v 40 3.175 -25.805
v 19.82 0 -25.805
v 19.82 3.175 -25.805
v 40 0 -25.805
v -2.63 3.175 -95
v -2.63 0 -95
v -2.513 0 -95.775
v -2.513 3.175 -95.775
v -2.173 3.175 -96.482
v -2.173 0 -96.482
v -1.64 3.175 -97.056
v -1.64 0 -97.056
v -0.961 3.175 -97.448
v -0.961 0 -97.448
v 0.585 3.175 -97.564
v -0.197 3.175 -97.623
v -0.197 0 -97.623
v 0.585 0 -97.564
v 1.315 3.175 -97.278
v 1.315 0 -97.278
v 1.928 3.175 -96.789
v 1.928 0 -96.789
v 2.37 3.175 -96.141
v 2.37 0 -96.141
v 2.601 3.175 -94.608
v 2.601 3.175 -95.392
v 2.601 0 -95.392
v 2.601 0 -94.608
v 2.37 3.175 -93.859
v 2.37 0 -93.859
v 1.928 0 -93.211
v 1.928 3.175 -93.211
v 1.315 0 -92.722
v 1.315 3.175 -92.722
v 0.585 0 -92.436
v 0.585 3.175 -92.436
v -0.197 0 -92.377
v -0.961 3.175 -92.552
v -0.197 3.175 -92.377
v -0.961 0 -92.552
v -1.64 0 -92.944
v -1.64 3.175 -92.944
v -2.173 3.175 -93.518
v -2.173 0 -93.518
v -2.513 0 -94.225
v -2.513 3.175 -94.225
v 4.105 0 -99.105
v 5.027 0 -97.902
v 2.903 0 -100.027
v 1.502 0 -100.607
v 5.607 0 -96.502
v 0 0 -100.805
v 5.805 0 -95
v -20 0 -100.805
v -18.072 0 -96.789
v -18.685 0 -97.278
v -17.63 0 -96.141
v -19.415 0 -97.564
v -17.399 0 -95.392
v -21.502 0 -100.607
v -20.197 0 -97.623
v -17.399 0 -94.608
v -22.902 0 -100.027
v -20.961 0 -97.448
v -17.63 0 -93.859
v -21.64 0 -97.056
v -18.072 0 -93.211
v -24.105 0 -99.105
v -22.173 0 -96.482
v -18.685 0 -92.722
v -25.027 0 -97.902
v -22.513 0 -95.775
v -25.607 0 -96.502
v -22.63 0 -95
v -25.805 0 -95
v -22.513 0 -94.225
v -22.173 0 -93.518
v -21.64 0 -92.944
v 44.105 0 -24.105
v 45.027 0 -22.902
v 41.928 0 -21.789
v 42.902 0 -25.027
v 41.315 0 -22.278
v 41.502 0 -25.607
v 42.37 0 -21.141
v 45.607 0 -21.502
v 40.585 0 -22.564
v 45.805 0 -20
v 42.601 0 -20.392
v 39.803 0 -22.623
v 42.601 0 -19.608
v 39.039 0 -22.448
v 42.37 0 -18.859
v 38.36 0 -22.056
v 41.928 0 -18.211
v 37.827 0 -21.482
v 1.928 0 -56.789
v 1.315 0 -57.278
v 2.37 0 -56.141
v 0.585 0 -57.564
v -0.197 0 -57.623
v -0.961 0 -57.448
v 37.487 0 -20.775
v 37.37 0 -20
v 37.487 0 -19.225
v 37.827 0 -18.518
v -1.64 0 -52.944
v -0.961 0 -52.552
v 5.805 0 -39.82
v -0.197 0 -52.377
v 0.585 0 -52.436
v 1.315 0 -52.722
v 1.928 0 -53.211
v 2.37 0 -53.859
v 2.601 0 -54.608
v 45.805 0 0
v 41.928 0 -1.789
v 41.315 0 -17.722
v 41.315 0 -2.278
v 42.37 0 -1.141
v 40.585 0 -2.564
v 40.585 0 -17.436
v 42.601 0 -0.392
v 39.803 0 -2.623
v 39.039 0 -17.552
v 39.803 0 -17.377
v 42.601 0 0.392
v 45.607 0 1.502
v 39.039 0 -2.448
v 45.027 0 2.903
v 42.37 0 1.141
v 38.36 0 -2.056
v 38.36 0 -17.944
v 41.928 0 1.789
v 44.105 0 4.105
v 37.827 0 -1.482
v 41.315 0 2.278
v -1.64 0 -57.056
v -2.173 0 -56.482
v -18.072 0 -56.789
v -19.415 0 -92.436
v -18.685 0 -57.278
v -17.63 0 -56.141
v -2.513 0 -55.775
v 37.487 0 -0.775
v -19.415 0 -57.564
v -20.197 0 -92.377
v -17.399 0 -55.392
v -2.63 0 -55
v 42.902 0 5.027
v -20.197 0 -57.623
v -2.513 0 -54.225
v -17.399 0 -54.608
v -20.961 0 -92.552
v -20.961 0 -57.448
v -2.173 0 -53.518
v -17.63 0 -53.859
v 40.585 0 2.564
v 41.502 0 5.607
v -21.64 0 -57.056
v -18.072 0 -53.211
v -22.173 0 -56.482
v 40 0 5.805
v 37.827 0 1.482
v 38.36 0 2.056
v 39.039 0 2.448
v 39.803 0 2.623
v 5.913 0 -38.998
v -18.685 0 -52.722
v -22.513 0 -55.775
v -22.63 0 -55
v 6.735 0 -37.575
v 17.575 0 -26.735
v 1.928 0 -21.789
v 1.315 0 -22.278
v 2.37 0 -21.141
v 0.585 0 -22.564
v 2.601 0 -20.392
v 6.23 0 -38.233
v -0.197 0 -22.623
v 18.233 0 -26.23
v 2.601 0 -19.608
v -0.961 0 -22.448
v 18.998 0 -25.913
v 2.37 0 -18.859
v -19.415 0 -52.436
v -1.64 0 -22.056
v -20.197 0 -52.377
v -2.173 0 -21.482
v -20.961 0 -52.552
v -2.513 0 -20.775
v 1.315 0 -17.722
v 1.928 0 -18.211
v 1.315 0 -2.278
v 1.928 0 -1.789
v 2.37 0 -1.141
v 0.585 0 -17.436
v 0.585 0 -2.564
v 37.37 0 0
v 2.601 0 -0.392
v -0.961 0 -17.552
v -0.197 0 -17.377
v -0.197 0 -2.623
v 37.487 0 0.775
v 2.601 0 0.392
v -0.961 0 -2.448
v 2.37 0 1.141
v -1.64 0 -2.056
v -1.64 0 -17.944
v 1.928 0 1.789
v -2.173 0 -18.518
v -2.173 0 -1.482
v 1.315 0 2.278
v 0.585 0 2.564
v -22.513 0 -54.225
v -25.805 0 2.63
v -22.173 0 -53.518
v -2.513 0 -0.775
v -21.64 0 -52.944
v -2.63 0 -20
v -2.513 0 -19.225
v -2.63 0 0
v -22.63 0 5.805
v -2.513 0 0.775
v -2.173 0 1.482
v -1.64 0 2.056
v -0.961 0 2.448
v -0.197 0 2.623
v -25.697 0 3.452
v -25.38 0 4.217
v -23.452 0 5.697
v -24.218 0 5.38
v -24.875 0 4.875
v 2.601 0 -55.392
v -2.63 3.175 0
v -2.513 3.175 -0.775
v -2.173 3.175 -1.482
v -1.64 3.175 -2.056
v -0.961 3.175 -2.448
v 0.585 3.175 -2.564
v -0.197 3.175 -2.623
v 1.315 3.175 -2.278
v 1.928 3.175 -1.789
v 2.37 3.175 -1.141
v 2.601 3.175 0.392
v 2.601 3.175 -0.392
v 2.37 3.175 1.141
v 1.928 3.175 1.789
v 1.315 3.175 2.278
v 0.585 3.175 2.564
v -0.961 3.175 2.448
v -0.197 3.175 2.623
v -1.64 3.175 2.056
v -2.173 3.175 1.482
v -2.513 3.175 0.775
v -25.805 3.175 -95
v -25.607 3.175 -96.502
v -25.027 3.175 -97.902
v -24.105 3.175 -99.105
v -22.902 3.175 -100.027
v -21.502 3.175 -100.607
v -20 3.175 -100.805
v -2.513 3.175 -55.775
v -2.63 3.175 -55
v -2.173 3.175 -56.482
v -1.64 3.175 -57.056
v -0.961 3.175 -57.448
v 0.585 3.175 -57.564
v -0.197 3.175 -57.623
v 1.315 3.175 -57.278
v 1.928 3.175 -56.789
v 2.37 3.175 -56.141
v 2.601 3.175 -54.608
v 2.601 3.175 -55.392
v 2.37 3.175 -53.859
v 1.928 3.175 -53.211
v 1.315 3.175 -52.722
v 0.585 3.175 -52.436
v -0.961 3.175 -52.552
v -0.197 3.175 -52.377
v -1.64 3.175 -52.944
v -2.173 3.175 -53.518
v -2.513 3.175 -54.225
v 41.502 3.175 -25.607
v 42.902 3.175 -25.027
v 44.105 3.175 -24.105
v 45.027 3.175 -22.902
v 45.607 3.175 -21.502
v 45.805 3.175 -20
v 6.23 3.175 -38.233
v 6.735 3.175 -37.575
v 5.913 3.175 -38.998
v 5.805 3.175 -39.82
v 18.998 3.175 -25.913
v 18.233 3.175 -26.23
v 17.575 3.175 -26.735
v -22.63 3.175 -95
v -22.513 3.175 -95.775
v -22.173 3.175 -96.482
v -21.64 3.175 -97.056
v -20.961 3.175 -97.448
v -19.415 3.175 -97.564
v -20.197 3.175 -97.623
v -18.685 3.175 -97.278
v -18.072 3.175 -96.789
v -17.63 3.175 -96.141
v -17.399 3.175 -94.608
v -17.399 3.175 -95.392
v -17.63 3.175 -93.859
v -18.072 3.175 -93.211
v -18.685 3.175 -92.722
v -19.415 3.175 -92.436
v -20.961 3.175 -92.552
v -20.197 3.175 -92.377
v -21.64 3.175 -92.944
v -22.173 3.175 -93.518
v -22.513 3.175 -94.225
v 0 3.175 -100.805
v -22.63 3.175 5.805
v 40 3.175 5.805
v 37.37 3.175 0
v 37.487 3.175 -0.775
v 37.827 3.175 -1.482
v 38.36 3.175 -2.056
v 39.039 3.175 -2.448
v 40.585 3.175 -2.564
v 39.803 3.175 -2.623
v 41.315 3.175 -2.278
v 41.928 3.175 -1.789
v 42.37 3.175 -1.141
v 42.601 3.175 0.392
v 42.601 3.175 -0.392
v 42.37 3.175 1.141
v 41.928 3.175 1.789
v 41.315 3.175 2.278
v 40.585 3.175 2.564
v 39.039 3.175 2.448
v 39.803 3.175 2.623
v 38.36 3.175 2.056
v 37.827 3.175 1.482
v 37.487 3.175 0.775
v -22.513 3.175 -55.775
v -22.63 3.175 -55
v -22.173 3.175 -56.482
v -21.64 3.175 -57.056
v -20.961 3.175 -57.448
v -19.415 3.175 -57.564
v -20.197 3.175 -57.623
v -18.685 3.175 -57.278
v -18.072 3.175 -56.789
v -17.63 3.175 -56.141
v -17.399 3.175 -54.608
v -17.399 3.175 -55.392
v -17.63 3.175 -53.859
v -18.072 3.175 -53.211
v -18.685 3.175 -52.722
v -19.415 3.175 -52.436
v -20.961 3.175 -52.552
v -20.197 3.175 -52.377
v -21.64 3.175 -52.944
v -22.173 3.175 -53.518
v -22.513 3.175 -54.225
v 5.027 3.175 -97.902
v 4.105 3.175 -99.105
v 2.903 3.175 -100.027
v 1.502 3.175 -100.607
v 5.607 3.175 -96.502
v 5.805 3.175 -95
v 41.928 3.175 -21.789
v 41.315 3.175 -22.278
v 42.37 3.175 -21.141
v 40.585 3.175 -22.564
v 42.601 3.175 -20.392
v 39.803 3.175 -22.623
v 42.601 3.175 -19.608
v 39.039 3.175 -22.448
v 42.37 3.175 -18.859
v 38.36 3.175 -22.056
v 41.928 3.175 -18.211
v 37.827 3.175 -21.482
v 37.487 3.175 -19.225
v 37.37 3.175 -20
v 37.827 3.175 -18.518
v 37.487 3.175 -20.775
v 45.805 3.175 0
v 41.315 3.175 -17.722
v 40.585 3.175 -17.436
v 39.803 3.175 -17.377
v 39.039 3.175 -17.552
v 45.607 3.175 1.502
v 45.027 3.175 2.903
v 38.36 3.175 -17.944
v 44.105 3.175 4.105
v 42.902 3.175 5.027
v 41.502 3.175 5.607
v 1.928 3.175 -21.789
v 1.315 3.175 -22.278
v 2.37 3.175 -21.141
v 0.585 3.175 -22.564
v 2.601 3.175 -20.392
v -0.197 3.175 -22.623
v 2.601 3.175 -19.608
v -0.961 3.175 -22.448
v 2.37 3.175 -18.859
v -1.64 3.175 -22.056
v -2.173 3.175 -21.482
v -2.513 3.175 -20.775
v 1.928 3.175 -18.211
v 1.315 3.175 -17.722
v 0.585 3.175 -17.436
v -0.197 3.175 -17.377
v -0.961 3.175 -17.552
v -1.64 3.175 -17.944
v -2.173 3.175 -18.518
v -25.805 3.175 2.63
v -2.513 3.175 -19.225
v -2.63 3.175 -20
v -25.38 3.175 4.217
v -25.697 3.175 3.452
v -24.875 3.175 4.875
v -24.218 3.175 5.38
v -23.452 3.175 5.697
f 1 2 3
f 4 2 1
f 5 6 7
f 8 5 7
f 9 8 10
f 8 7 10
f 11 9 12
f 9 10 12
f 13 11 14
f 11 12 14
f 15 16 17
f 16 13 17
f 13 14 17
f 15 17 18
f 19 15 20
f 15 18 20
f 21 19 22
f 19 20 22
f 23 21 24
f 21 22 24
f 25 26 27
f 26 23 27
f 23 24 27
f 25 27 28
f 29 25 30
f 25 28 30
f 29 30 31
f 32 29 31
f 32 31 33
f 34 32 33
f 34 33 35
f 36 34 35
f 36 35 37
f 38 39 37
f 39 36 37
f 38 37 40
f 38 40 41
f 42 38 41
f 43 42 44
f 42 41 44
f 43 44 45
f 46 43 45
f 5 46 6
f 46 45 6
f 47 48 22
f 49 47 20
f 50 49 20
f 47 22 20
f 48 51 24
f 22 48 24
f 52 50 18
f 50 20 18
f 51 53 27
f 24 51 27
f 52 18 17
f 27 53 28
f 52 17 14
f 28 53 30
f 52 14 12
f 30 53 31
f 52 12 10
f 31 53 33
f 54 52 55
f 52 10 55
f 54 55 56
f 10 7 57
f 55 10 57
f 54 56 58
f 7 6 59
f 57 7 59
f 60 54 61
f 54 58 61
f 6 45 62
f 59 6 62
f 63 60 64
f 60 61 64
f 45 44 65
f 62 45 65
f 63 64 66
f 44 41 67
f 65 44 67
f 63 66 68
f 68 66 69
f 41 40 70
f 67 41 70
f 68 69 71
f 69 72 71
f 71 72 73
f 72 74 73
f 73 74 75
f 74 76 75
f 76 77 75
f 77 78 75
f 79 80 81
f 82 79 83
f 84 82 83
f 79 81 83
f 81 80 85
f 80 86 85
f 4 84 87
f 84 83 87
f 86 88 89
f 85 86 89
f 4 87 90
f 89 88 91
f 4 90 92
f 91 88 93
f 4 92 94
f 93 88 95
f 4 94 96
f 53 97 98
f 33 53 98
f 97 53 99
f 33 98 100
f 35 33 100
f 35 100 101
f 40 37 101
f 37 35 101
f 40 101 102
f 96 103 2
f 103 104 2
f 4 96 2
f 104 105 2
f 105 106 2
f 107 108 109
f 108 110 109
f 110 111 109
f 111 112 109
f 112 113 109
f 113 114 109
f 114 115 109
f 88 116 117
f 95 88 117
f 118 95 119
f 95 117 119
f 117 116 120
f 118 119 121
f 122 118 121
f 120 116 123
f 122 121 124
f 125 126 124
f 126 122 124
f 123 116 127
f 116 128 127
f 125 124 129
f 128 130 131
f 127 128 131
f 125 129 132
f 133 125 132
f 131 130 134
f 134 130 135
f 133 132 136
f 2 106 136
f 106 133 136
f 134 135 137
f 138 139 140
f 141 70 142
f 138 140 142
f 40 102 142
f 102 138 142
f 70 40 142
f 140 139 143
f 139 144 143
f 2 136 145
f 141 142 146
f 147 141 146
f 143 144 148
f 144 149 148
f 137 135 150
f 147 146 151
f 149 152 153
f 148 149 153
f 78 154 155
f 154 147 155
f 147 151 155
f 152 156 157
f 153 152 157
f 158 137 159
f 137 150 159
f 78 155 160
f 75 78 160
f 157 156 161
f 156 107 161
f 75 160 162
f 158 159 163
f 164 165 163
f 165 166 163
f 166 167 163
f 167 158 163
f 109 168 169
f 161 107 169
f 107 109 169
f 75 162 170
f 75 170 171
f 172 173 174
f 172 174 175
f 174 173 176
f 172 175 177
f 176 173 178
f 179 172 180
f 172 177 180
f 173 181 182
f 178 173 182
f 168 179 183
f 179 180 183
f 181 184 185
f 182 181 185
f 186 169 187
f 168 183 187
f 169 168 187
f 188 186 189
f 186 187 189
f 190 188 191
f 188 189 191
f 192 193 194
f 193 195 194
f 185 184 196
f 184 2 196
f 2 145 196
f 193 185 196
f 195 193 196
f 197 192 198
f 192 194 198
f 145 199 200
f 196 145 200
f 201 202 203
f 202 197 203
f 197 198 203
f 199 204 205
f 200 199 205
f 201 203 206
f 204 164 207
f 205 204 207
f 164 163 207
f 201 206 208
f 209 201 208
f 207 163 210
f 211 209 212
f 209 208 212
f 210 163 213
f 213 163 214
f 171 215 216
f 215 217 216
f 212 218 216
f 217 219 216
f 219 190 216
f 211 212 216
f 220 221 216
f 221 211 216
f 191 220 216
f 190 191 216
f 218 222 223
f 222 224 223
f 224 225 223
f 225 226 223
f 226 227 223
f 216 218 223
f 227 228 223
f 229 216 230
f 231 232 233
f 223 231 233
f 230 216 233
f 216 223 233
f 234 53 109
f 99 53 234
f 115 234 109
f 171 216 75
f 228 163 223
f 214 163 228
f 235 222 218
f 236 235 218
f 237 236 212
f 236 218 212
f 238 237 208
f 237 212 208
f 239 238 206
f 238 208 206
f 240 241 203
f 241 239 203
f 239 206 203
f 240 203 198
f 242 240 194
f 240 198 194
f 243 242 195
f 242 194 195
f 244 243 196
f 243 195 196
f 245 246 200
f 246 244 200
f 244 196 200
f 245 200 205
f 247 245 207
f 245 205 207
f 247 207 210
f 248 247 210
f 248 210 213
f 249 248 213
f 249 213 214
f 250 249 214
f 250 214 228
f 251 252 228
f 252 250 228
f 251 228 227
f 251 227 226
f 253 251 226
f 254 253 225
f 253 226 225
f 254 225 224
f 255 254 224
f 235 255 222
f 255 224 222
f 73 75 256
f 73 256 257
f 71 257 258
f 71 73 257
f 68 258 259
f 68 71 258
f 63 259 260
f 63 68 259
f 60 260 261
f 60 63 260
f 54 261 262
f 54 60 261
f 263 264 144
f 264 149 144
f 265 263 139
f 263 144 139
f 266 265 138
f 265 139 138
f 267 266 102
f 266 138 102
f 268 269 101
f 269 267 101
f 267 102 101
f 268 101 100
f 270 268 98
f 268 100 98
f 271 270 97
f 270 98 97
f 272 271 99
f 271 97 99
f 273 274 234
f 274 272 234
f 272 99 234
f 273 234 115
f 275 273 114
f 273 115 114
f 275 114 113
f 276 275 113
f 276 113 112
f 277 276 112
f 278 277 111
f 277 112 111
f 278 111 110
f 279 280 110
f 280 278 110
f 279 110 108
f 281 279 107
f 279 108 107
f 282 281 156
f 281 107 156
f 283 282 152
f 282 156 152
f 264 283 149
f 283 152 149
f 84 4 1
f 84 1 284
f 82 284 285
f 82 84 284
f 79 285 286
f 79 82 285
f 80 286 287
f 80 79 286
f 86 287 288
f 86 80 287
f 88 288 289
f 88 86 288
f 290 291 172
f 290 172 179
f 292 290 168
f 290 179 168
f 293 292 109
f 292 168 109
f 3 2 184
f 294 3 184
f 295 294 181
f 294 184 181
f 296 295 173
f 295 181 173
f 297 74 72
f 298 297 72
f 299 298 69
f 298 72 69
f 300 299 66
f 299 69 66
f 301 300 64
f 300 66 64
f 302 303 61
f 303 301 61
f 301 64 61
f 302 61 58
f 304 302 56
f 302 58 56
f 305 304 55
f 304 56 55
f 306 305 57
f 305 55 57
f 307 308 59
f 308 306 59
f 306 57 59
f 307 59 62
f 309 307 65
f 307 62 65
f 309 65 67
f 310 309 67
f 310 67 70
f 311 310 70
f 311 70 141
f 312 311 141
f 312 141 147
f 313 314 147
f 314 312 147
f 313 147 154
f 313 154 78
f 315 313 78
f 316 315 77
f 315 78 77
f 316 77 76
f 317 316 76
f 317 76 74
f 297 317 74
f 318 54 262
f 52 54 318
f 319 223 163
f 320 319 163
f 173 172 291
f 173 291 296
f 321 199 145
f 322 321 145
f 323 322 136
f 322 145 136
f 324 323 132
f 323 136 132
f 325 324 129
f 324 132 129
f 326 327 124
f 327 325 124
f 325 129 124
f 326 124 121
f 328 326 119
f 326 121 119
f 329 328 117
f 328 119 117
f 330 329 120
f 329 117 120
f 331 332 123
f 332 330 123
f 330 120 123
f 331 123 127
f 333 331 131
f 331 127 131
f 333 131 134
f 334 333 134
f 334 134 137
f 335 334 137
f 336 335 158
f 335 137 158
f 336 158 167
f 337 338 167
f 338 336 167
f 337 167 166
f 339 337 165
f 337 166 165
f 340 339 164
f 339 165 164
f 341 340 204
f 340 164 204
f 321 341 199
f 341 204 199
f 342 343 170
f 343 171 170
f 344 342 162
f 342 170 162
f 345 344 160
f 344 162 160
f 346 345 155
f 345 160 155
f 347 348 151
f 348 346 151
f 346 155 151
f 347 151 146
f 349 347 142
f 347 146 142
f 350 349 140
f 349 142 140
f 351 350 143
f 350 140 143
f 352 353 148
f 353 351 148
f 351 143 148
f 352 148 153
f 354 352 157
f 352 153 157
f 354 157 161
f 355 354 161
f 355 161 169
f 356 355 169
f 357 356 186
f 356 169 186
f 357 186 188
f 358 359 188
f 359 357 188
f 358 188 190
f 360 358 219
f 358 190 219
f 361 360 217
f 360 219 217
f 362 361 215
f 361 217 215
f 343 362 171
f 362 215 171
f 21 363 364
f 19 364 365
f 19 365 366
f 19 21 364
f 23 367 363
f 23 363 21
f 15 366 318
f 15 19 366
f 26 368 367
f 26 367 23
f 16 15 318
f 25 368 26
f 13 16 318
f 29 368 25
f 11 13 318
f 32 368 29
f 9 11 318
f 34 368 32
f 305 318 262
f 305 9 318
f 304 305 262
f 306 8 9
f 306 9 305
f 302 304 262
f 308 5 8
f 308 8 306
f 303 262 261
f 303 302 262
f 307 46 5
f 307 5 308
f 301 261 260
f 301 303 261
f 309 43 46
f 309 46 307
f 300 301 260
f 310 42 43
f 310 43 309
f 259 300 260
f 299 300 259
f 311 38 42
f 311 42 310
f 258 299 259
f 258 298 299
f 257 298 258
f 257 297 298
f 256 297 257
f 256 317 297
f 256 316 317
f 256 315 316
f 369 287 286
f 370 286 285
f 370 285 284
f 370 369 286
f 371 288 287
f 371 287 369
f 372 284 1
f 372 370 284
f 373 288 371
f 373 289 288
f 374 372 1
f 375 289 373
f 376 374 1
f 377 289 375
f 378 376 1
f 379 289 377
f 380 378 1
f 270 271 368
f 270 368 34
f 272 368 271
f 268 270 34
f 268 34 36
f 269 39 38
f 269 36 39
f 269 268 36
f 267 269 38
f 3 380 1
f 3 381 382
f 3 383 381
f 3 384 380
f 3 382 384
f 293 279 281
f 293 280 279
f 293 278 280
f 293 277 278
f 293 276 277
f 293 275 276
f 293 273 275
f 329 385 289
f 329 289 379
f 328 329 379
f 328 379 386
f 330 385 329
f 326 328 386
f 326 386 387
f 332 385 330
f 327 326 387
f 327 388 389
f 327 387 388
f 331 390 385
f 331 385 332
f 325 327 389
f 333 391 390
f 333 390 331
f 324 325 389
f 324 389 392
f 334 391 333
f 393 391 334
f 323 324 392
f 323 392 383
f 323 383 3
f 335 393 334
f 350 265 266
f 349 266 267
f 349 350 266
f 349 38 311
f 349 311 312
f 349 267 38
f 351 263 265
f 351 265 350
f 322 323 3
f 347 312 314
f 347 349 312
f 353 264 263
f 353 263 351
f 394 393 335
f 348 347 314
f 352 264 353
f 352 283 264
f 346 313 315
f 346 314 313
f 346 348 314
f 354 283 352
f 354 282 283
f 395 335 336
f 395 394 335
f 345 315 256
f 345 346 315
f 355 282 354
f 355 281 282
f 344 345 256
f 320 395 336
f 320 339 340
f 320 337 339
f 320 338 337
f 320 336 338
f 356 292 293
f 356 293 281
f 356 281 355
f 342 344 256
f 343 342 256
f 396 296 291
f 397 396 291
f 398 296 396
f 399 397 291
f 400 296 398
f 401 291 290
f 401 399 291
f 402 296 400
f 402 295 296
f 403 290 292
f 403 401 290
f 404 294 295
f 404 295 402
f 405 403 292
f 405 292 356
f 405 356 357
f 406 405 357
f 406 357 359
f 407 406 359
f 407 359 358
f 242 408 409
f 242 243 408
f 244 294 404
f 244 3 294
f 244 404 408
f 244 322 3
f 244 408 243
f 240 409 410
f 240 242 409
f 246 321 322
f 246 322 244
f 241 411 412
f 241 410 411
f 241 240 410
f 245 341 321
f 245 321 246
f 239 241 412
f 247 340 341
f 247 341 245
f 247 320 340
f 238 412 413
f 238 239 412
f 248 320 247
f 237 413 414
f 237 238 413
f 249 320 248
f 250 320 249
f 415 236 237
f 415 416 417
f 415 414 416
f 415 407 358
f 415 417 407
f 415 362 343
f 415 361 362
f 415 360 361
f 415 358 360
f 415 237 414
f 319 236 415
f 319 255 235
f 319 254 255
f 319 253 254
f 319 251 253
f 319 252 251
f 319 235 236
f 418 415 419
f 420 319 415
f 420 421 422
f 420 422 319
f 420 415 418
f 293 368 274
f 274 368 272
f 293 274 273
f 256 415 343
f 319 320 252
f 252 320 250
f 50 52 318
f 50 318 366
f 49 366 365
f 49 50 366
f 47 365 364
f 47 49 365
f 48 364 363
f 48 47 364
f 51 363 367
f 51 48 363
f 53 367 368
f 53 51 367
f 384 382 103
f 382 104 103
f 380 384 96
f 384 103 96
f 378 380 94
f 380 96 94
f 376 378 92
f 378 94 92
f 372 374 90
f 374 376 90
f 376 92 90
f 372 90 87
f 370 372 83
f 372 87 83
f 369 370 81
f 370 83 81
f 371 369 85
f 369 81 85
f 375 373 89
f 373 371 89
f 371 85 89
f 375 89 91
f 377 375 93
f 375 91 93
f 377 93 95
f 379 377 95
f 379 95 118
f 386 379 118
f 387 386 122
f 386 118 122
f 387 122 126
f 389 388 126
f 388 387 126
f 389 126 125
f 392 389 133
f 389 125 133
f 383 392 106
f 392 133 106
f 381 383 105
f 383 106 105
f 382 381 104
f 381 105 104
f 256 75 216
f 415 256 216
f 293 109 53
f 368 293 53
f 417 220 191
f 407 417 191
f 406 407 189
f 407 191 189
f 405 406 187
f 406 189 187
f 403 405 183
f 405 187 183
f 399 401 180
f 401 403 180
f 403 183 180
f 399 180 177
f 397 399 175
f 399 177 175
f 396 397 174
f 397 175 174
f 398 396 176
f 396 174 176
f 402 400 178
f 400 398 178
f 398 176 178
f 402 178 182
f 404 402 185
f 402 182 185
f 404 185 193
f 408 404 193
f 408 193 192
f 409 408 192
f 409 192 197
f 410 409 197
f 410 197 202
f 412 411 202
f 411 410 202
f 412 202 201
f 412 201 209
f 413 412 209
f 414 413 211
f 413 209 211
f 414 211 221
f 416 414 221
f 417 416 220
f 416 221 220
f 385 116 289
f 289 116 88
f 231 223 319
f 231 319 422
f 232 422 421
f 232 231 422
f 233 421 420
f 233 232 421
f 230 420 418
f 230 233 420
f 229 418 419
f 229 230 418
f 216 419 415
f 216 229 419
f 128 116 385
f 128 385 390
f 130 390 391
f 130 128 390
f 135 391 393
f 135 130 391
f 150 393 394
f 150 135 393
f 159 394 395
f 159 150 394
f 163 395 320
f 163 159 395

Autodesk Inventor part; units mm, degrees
ref_plane "YZ Plane" through (0, 0, 0) normal (1, 0, 0) x (0, 1, 0)
ref_plane "XZ Plane" through (0, 0, 0) normal (0, 1, 0) x (-1, 0, 0)
ref_plane "XY Plane" through (0, 0, 0) normal (0, 0, 1) x (1, 0, 0)
sketch "Sketch1" plane through (0, 0, 0) normal (0, 1, 0) x (-1, 0, 0)
  circle A0 centre (0, 0) radius 2.63
  line L0 (0, 0) -> (0, -2.63) construction
  line L1 (0, 0) -> (-2.63, 0) construction
  circle A1 centre (0, -20) radius 2.63
  circle A2 centre (-20, 0) radius 2.63 construction
  circle A3 centre (-20, -20) radius 2.63 construction
  circle A4 centre (-40, 0) radius 2.63
  circle A5 centre (-40, -20) radius 2.63
  circle A6 centre (0, -55) radius 2.63
  circle A7 centre (20, -55) radius 2.63
  circle A8 centre (20, -95) radius 2.63
  circle A9 centre (0, -95) radius 2.63
  circle A10 centre (0, 0) radius 5.805 construction
  circle A11 centre (20, -55) radius 5.805 construction
  circle A12 centre (0, -55) radius 5.805 construction
  circle A13 centre (20, -95) radius 5.805 construction
  circle A14 centre (0, -95) radius 5.805 construction
  circle A15 centre (-40, -20) radius 5.805 construction
  circle A16 centre (-40, 0) radius 5.805 construction
  line L2 (25.805, -95) -> (25.805, 2.63)
  line L3 (22.63, 5.805) -> (-40, 5.805)
  line L4 (-45.805, 0) -> (-45.805, -20)
  line L5 (-19.8201, -25.805) -> (-40, -25.805)
  circle A17 centre (-20, -20) radius 5.805 construction
  line L6 (-5.805, -39.8201) -> (-5.805, -95)
  line L7 (20, -100.805) -> (0, -100.805)
  arc A18 (20, -100.805) -> (25.805, -95) centre (20, -95) ccw
  arc A19 (-5.805, -95) -> (0, -100.805) centre (0, -95) ccw
  arc A20 (-45.805, -20) -> (-40, -25.805) centre (-40, -20) ccw
  arc A21 (-40, 5.805) -> (-45.805, 0) centre (-40, 0) ccw
  line L8 (-6.7349, -37.5751) -> (-17.5751, -26.7349)
  arc A22 (-5.805, -39.8201) -> (-6.7349, -37.5751) centre (-8.98, -39.8201) ccw
  arc A23 (-17.5751, -26.7349) -> (-19.8201, -25.805) centre (-19.8201, -28.98) ccw
  arc A24 (25.805, 2.63) -> (22.63, 5.805) centre (22.63, 2.63) ccw
  point P0 (0, -22.63)
  point P1 (-2.63, -20)
  point P2 (-20, -2.63)
  point P3 (-22.63, 0)
  point P4 (-20, -22.63)
  point P5 (-22.63, -20)
  point P6 (-40, -2.63)
  point P7 (-42.63, 0)
  point P8 (-40, -22.63)
  point P9 (-42.63, -20)
  point P10 (-5.805, -25.805)
  point P11 (-5.805, -38.505)
  point P12 (-18.505, -25.805)
  dimension "d0" = 5.26
  dimension "d3" = 20
  dimension "d6" = 20
  dimension "d10" = 20
  dimension "d12" = 75
  dimension "d13" = 40
  dimension "d14" = 3.175
  dimension "d16" = 12.7
  dimension "d17" = 12.7
  dimension "d18" = 3.175
extrude "Extrusion1" add sketch "Sketch1" along normal blind 3.175
equation "\"d17\" = d16"
properties part number "CNC-013-ZAxisMainMount" material "Aluminum 6061"
